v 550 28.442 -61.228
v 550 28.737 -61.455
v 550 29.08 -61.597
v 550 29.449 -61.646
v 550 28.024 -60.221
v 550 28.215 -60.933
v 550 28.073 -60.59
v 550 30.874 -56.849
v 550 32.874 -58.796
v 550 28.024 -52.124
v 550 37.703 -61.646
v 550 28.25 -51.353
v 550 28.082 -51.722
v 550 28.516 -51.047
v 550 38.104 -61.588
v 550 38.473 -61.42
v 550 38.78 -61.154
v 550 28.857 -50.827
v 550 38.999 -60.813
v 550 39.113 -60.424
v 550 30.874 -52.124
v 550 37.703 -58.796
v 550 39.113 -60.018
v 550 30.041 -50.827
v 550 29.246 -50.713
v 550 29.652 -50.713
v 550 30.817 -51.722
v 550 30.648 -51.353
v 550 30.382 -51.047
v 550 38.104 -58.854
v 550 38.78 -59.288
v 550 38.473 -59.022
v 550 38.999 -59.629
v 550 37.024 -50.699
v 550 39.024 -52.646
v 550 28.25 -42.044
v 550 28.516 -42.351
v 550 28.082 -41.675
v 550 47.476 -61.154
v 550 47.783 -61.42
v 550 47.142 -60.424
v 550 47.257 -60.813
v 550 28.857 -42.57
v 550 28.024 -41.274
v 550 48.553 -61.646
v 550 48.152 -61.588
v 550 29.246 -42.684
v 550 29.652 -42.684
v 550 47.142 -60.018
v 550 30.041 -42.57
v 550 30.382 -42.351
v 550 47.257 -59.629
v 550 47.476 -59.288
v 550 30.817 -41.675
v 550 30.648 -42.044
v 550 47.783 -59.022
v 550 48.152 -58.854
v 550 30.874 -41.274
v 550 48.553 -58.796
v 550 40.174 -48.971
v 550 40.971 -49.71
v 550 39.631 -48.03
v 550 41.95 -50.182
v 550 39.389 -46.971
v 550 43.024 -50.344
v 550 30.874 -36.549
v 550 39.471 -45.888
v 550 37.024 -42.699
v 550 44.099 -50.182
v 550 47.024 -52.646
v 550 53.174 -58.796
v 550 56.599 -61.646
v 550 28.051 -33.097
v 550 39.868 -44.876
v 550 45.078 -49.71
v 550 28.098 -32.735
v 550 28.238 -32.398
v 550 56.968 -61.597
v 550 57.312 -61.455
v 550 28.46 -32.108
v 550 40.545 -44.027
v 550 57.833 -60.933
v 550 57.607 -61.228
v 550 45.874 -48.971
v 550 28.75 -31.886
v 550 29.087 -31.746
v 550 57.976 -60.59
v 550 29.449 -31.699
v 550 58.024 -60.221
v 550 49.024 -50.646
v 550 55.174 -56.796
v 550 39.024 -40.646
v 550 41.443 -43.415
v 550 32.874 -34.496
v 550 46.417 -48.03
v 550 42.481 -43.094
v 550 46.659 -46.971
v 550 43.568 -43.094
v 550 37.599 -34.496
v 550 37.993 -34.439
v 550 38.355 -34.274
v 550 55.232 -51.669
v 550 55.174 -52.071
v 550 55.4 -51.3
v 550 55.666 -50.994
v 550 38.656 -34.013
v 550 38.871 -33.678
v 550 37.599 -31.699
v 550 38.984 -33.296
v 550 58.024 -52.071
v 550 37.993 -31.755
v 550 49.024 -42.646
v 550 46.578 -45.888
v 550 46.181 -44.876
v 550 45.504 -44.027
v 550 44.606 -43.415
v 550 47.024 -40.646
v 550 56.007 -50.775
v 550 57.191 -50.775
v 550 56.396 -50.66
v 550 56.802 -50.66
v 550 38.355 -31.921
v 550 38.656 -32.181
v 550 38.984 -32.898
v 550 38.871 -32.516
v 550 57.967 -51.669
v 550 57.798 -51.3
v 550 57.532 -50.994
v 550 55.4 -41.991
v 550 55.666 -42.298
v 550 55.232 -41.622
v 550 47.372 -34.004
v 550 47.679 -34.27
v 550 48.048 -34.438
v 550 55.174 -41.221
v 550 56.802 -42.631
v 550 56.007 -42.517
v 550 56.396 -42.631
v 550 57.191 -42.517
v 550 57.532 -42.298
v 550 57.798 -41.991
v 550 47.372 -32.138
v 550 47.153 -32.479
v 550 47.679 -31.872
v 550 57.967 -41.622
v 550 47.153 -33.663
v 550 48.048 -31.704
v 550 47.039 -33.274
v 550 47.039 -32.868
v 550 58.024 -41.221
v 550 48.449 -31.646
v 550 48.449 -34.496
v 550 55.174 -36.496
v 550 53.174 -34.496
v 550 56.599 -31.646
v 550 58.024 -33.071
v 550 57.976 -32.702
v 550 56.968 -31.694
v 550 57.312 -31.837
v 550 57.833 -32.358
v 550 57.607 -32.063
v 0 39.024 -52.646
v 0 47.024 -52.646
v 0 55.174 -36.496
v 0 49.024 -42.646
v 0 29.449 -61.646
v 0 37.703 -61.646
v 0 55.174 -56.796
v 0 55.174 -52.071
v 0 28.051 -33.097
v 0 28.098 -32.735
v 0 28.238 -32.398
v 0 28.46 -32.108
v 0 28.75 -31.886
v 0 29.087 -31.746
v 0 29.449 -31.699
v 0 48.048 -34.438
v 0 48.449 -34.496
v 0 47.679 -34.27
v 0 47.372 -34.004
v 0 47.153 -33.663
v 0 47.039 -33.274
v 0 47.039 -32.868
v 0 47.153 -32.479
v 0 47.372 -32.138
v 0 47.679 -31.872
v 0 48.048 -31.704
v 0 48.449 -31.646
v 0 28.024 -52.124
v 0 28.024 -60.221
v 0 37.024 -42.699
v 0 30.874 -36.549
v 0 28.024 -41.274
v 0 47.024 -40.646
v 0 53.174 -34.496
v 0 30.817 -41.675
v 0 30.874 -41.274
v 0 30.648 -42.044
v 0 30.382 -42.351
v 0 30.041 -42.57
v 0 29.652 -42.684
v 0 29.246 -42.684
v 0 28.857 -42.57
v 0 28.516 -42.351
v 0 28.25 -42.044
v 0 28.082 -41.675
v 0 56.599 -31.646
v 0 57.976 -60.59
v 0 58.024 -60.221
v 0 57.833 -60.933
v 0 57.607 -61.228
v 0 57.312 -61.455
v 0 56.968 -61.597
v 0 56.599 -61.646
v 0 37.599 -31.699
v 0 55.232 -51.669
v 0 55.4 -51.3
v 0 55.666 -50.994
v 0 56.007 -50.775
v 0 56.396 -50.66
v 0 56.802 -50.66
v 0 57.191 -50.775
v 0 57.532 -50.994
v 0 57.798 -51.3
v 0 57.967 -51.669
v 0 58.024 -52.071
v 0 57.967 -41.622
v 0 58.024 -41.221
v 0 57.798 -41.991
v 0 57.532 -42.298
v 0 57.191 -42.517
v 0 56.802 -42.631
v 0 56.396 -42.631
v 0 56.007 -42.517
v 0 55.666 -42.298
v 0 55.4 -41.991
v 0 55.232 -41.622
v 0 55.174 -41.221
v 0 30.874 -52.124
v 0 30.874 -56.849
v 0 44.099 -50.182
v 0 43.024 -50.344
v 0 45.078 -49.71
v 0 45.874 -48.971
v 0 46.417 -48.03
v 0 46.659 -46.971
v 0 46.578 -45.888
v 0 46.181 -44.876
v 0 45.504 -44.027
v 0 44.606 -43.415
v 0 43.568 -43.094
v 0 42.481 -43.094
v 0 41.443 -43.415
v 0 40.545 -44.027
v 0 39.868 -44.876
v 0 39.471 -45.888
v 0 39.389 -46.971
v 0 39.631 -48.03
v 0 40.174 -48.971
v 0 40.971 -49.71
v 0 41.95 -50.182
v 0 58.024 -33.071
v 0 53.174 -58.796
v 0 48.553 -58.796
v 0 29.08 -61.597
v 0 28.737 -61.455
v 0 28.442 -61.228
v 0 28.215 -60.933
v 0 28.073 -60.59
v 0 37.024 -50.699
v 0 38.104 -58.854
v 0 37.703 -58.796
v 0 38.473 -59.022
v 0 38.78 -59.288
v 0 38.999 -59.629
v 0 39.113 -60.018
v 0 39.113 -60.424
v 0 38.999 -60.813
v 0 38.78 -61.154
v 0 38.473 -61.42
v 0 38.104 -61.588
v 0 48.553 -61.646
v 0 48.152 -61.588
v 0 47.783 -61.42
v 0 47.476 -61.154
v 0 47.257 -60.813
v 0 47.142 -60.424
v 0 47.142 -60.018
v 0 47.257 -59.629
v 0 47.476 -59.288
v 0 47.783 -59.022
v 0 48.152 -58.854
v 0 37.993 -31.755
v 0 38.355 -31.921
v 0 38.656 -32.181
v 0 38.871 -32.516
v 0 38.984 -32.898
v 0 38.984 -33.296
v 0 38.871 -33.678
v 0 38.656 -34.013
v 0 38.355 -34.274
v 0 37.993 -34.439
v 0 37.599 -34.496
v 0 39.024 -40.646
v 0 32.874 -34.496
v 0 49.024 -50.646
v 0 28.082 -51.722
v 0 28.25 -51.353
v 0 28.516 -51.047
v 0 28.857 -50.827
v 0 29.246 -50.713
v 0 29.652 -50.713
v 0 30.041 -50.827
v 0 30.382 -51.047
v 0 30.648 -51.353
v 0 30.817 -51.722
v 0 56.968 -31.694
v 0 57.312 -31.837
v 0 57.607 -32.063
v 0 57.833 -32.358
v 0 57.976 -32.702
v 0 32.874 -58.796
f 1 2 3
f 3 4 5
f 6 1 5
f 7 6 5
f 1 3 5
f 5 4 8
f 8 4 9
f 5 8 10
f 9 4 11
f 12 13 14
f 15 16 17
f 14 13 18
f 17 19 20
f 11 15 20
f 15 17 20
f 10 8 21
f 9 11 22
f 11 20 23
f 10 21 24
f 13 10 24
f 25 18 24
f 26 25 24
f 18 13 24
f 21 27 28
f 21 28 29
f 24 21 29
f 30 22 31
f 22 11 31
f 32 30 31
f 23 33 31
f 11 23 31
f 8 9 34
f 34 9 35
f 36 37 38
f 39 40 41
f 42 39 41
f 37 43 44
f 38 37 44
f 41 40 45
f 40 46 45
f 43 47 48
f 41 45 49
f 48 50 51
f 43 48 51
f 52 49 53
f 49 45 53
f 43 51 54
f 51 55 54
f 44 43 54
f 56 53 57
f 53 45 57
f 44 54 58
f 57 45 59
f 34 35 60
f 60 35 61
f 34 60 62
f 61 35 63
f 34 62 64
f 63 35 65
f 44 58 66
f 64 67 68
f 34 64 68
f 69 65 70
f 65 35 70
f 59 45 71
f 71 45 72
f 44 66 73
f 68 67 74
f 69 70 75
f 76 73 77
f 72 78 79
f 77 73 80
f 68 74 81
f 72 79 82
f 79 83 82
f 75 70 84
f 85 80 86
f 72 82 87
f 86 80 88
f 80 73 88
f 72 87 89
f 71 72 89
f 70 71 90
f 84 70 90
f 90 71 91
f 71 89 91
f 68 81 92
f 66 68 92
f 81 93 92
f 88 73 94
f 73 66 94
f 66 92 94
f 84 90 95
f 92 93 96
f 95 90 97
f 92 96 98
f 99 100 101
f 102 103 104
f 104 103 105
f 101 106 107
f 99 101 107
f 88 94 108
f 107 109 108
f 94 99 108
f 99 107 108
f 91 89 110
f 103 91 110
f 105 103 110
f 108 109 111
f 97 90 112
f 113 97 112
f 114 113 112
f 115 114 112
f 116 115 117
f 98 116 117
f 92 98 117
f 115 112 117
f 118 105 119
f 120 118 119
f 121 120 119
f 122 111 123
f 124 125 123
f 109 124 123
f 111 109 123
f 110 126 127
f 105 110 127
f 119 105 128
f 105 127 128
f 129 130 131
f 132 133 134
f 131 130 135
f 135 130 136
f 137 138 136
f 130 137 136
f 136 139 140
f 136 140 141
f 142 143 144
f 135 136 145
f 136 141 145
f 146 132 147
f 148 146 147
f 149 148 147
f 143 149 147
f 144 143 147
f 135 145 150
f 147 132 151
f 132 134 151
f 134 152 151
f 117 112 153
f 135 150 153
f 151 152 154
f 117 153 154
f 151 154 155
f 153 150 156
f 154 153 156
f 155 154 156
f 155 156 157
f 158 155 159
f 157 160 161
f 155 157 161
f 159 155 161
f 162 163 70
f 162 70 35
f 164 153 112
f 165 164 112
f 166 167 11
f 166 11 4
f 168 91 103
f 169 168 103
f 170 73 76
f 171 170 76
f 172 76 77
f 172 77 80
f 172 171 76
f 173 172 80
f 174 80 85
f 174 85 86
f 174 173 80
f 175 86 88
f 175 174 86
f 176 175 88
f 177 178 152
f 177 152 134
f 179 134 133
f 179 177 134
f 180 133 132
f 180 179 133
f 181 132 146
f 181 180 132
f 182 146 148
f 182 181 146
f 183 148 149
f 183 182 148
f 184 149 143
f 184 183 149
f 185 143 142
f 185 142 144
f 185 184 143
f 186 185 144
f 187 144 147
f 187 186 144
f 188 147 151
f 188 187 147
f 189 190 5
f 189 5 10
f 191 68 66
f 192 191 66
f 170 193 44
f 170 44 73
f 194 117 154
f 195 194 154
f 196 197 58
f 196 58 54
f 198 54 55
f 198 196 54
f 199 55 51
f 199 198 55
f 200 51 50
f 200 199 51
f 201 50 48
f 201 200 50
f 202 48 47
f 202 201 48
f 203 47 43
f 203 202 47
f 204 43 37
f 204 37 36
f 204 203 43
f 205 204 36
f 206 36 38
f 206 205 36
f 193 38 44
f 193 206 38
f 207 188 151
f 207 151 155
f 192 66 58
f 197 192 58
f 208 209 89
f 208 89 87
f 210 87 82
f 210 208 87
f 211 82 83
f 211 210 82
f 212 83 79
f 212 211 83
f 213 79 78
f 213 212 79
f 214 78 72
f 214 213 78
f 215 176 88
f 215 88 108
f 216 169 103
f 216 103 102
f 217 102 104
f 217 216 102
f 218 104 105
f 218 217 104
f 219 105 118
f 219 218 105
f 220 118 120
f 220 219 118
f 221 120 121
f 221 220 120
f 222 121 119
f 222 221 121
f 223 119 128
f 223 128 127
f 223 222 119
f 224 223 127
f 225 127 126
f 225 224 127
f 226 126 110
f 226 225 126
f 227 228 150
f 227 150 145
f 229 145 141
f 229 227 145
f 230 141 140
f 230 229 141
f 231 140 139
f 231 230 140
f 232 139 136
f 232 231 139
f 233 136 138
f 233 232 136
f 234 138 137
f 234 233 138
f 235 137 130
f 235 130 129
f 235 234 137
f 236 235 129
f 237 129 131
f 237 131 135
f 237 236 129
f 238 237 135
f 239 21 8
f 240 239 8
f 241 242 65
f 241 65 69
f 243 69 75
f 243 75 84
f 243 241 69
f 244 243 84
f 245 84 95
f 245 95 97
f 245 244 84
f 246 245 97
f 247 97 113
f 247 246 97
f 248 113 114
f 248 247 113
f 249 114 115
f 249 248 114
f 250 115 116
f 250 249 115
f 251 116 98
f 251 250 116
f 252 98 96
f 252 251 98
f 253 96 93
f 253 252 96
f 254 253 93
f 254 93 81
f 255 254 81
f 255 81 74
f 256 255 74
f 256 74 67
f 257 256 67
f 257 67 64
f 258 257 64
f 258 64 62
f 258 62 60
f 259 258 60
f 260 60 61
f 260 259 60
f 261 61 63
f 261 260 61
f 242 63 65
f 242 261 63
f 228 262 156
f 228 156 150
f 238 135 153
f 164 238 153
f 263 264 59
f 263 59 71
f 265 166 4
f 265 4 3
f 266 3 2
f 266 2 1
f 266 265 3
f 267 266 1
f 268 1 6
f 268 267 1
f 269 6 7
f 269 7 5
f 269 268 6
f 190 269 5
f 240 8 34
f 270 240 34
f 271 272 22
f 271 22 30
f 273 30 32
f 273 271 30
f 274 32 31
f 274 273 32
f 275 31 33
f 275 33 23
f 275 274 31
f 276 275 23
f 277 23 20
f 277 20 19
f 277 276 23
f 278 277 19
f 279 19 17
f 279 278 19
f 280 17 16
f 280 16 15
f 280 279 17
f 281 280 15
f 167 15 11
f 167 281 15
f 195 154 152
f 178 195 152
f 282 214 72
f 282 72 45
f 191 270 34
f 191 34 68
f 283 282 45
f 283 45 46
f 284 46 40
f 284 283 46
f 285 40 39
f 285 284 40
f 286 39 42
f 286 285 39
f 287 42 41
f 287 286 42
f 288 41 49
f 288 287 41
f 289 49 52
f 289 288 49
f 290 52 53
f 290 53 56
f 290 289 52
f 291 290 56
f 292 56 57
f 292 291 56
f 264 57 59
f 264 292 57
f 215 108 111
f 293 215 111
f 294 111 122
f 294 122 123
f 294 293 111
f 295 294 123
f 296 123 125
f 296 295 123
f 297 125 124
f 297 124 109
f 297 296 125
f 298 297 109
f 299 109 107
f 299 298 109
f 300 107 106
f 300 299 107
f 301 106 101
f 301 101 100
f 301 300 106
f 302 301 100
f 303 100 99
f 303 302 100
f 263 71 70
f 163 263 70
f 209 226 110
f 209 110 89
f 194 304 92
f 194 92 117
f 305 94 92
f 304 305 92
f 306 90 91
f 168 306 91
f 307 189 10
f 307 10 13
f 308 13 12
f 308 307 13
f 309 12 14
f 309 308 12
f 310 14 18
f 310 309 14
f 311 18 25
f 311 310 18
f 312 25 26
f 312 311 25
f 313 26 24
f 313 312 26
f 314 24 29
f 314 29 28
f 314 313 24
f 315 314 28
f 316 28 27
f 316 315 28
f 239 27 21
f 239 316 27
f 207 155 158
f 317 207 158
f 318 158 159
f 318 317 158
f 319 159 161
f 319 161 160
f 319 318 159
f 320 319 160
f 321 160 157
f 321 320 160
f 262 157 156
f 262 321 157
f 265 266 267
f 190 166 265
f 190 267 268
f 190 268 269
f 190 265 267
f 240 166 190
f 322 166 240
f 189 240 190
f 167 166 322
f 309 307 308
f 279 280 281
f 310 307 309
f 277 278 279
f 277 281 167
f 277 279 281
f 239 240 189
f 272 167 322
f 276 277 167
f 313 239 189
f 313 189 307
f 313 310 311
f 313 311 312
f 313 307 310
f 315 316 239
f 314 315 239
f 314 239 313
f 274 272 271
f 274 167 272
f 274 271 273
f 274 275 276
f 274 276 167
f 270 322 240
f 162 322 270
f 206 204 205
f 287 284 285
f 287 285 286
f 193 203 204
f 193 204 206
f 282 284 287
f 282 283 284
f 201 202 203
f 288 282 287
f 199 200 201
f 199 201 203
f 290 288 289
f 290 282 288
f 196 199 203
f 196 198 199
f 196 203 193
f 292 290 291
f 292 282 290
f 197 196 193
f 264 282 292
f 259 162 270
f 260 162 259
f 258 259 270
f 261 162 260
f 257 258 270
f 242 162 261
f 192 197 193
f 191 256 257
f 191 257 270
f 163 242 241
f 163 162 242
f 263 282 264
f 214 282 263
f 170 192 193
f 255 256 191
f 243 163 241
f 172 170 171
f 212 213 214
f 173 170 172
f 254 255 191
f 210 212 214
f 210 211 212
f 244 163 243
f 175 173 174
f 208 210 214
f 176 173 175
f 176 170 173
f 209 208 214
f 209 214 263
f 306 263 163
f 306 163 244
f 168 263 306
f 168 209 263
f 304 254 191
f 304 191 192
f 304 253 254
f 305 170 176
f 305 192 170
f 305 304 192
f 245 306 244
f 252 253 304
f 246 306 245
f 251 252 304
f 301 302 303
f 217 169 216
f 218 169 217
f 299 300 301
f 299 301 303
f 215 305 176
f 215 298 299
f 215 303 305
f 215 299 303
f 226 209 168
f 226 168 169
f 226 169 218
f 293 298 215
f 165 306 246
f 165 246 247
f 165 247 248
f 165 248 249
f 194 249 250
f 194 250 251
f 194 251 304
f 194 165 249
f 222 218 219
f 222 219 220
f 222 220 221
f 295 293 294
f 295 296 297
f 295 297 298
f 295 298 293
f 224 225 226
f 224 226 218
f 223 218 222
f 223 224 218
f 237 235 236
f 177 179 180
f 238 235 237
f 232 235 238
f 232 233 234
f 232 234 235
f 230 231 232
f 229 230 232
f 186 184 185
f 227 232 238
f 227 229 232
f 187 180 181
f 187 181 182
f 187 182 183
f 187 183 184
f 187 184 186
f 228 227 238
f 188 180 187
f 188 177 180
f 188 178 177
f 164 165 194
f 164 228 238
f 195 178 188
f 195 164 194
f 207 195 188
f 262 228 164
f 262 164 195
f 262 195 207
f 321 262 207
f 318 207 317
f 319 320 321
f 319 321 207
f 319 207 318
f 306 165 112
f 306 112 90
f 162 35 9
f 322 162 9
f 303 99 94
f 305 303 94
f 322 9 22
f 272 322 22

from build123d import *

# Parameters (mm, degrees)
SKETCH1_R           = 3.645
BOSS_EXTRUDE1_DEPTH = 550


with BuildPart() as part:
    # Sketch1 → Boss-Extrude1 (new body)
    with BuildSketch(Plane(origin=(0, 0, 0), x_dir=(0, 0, -1), z_dir=(1, 0, 0))):
        with BuildLine():
            Line((52.123693748, 30.874275451), (56.848693748, 30.874275451))
            Line((56.848693748, 30.874275451), (50.698693748, 37.024275451))
            Line((50.698693748, 37.024275451), (42.698693748, 37.024275451))
            Line((42.698693748, 37.024275451), (36.548693748, 30.874275451))
            Line((36.548693748, 30.874275451), (41.273693748, 30.874275451))
            ThreePointArc((41.273693748, 30.874275451), (42.698693748, 29.449275451), (41.273693748, 28.024275451))
            Line((41.273693748, 28.024275451), (33.097257975, 28.050711224))
            ThreePointArc((33.097257975, 28.050711224), (32.108323726, 28.460341202), (31.698693748, 29.449275451))
            Line((31.698693748, 29.449275451), (31.698693748, 37.599275451))
            ThreePointArc((31.698693748, 37.599275451), (33.097257975, 38.997839678), (34.495822203, 37.599275451))
            Line((34.495822203, 37.599275451), (34.495822203, 32.874275451))
            Line((34.495822203, 32.874275451), (40.645822203, 39.024275451))
            Line((40.645822203, 39.024275451), (40.645822203, 47.024275451))
            Line((40.645822203, 47.024275451), (34.495822203, 53.174275451))
            Line((34.495822203, 53.174275451), (34.495822203, 48.449275451))
            ThreePointArc((34.495822203, 48.449275451), (33.070822203, 47.024275451), (31.645822203, 48.449275451))
            Line((31.645822203, 48.449275451), (31.645822203, 56.599228861))
            ThreePointArc((31.645822203, 56.599228861), (32.06319504, 57.606856024), (33.070822203, 58.024228861))
            Line((33.070822203, 58.024228861), (41.220822203, 58.024228861))
            ThreePointArc((41.220822203, 58.024228861), (42.645822203, 56.599228861), (41.220822203, 55.174228861))
            Line((41.220822203, 55.174228861), (36.495822203, 55.174228861))
            Line((36.495822203, 55.174228861), (42.645822203, 49.024228861))
            Line((42.645822203, 49.024228861), (50.645822203, 49.024228861))
            Line((50.645822203, 49.024228861), (56.795822203, 55.174228861))
            Line((56.795822203, 55.174228861), (52.070822203, 55.174228861))
            ThreePointArc((52.070822203, 55.174228861), (50.645822203, 56.599228861), (52.070822203, 58.024228861))
            Line((52.070822203, 58.024228861), (60.220822203, 58.024228861))
            ThreePointArc((60.220822203, 58.024228861), (61.228449366, 57.606856024), (61.645822203, 56.599228861))
            Line((61.645822203, 56.599228861), (61.645822203, 48.552972547))
            ThreePointArc((61.645822203, 48.552972547), (60.220822203, 47.127972547), (58.795822203, 48.552972547))
            Line((58.795822203, 48.552972547), (58.795822203, 53.174228861))
            Line((58.795822203, 53.174228861), (52.645822203, 47.024228861))
            Line((52.645822203, 47.024228861), (52.645822203, 39.024228861))
            Line((52.645822203, 39.024228861), (58.795822203, 32.874228861))
            Line((58.795822203, 32.874228861), (58.795822203, 37.702972547))
            ThreePointArc((58.795822203, 37.702972547), (60.220822203, 39.127972547), (61.645822203, 37.702972547))
            Line((61.645822203, 37.702972547), (61.645822203, 29.449275451))
            ThreePointArc((61.645822203, 29.449275451), (61.228449366, 28.441648288), (60.220822203, 28.024275451))
            Line((60.220822203, 28.024275451), (52.123693748, 28.024275451))
            ThreePointArc((52.123693748, 28.024275451), (50.698693748, 29.449275451), (52.123693748, 30.874275451))
        make_face()
        with Locations((46.698693748, 43.024275451)):
            Circle(SKETCH1_R, mode=Mode.SUBTRACT)
    extrude(amount=BOSS_EXTRUDE1_DEPTH)


solid = part.part
